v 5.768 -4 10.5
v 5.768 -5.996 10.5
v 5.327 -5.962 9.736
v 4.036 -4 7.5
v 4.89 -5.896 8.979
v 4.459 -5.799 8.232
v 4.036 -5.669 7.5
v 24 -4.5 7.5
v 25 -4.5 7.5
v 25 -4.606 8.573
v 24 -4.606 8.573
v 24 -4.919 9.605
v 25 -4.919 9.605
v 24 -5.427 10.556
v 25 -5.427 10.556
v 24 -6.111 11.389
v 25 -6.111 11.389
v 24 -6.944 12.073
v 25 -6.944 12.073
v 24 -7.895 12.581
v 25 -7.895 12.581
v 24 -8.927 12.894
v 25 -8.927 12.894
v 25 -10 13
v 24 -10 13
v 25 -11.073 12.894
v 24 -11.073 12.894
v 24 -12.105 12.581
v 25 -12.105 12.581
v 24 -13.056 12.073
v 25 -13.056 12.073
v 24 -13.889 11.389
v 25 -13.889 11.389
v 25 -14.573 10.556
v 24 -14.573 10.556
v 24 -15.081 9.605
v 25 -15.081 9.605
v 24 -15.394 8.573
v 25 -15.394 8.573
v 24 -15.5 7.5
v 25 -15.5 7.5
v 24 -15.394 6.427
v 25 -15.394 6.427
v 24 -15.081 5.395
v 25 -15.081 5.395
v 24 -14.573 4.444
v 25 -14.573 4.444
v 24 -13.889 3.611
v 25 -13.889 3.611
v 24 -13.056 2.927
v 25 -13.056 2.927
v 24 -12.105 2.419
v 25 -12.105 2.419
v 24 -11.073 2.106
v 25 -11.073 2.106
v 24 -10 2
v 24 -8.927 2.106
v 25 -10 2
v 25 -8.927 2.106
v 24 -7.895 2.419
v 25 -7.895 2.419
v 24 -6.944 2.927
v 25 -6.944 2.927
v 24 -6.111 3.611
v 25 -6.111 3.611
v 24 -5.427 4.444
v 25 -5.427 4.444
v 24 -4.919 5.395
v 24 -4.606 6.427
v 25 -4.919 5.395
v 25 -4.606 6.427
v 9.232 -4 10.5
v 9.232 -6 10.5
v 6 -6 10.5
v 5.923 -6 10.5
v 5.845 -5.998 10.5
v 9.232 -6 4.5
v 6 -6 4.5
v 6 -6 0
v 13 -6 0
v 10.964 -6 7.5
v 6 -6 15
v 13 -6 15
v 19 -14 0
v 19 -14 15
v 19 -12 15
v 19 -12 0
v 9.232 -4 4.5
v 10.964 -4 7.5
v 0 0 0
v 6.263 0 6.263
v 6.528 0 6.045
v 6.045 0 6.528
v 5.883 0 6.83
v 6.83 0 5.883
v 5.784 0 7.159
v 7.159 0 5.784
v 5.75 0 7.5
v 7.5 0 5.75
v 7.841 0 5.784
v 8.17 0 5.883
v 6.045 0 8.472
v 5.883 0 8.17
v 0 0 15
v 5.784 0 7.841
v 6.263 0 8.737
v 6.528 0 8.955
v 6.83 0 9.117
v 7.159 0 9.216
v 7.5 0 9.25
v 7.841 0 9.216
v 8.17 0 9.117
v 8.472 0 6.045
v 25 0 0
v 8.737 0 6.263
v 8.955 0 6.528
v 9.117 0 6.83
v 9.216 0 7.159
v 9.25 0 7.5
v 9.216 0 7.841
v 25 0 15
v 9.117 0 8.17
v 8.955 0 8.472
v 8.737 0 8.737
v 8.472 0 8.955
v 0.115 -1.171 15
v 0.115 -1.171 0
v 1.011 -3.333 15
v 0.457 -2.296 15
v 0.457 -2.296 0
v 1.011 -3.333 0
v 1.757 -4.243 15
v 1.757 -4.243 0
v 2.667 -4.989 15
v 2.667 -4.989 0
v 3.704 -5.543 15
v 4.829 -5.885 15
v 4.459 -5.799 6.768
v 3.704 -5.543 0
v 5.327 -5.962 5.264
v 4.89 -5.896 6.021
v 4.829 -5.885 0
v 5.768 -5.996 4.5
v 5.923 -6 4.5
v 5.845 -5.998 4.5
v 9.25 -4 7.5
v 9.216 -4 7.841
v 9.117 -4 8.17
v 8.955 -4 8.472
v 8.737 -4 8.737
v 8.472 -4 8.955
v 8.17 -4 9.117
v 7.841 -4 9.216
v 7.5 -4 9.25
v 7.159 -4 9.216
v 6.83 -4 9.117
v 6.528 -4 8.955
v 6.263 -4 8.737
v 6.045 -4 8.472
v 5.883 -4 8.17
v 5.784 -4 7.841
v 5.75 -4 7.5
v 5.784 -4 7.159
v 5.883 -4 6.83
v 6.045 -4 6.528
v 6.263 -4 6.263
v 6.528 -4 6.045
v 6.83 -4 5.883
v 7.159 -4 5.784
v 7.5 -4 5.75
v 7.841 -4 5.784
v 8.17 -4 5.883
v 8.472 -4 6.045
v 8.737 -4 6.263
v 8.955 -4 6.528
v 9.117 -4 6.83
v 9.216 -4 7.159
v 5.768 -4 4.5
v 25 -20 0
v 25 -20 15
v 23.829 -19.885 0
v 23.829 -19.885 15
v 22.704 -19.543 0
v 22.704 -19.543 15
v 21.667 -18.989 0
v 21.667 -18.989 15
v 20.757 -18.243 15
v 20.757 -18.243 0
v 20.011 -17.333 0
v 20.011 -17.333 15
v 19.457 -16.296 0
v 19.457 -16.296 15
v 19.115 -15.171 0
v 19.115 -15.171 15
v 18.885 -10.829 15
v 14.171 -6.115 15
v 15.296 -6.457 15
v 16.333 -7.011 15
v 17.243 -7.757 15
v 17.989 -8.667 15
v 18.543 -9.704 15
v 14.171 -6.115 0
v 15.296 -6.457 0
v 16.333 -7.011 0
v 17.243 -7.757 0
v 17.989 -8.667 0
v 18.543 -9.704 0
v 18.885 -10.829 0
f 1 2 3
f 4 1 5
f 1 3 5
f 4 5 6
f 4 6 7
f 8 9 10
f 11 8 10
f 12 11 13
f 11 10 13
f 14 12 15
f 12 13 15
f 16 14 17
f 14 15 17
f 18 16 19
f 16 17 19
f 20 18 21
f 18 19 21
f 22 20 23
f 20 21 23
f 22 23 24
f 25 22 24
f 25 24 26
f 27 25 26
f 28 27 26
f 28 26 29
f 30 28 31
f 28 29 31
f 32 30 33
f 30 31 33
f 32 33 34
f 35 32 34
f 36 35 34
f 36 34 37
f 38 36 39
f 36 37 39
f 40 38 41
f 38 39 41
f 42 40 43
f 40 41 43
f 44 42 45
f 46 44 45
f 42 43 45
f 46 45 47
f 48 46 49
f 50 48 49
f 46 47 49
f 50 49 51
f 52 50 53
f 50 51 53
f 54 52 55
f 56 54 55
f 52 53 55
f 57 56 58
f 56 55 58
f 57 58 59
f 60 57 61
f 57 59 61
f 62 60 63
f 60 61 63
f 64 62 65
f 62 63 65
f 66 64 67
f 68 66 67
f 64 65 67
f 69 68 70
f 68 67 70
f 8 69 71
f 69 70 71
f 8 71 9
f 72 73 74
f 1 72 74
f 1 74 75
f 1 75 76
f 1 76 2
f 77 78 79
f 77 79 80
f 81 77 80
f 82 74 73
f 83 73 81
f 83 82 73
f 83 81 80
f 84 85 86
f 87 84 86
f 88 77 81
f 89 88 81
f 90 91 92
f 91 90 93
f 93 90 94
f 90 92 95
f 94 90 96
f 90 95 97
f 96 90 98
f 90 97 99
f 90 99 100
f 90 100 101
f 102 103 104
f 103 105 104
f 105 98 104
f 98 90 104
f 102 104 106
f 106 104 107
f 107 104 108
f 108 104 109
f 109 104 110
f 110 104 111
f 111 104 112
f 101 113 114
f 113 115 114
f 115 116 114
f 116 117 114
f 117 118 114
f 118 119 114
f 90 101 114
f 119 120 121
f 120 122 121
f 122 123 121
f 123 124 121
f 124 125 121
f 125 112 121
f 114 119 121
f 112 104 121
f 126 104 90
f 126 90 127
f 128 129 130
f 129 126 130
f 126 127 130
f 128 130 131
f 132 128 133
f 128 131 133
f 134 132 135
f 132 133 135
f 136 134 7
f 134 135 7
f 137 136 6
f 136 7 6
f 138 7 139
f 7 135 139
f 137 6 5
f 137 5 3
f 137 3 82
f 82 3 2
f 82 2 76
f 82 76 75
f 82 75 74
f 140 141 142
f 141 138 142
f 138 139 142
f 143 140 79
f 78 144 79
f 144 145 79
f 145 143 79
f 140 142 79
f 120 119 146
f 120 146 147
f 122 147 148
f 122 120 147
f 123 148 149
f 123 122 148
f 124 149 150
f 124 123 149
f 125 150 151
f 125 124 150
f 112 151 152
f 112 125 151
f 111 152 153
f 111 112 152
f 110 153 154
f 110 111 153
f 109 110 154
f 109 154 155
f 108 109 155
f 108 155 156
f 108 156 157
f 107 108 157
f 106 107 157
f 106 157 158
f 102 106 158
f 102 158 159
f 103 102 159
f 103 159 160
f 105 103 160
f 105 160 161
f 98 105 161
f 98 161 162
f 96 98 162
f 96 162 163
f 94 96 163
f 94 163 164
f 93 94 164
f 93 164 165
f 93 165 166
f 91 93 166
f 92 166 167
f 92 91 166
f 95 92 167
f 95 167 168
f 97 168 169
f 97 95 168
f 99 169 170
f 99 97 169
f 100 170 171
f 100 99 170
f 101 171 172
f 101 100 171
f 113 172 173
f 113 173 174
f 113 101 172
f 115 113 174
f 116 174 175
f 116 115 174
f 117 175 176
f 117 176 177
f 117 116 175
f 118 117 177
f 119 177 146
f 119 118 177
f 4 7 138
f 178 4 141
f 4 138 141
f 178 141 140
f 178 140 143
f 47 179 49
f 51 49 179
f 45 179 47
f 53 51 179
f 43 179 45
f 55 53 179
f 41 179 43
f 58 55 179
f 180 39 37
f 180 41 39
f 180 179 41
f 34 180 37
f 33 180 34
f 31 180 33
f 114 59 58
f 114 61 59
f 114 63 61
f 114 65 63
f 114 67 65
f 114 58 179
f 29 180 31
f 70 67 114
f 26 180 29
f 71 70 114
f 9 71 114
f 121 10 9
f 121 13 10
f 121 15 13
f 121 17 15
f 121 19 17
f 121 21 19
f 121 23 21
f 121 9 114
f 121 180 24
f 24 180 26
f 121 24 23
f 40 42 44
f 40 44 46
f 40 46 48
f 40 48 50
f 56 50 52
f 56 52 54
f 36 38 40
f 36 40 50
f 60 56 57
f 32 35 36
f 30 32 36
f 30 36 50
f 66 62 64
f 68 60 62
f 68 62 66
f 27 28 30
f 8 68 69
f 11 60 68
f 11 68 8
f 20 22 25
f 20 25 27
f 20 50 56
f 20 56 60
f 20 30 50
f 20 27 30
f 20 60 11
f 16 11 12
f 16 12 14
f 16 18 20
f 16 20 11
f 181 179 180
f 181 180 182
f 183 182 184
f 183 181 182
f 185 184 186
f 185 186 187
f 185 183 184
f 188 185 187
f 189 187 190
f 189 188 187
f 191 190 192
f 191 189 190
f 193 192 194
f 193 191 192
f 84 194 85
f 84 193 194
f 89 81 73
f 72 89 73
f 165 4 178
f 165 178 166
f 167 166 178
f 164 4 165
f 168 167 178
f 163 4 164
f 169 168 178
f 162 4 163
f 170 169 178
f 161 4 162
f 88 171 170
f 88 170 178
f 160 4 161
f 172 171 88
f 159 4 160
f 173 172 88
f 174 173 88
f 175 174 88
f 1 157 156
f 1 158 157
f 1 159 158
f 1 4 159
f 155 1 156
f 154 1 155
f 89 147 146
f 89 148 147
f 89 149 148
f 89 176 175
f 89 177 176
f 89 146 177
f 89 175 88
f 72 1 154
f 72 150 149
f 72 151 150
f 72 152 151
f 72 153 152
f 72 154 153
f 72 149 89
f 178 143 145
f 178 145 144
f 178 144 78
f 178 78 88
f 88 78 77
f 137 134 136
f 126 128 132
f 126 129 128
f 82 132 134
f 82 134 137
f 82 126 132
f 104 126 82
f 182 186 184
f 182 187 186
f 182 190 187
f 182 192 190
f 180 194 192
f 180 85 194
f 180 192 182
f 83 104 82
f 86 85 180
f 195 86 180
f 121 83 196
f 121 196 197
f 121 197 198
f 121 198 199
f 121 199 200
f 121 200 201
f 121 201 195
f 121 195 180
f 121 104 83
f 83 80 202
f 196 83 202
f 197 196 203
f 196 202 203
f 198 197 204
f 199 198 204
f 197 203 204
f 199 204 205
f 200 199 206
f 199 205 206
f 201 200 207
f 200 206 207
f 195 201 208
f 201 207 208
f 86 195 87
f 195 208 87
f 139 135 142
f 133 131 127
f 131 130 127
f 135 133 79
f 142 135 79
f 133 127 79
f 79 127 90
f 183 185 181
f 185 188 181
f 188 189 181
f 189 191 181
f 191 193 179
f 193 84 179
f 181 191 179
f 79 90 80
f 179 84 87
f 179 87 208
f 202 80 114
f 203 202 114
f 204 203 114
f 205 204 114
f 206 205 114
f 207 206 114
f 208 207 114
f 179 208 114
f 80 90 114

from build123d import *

# Parameters (mm, degrees)
F3_W         = 25
F3_H         = 15
F3_R         = 1.75
F4_DEPTH     = 6
F5_W         = 14
F5_H         = 15
F6_DEPTH     = 6
F7_R         = 5.5
F8_DEPTH     = 1
F9_R         = 1.75
F10_DEPTH    = 2
F11_T1_DEPTH = 15
F11_T3_DEPTH = 45


# Not quite as in the source:
# - a fillet or chamfer that OpenCascade refuses, or shapes differently, is made with other operations: its cross-section is extruded or revolved along the edge and cut away or added


with BuildPart() as f4:
    # F3 (on Front) → F4 (new body)
    with BuildSketch(Plane.XZ):
        with Locations((12.5, 7.5)):
            Rectangle(F3_W, F3_H)
        with Locations((7.5, 7.5)):
            Circle(F3_R, mode=Mode.SUBTRACT)
    extrude(amount=F4_DEPTH)

    # F5 (on face) → F6 (join)
    with BuildSketch(Plane.YZ.offset(25)):
        with Locations((-13, 7.5)):
            Rectangle(F5_W, F5_H)
    extrude(amount=-F6_DEPTH)

    # F7 (on face) → F8 (cut)
    with BuildSketch(Plane.YZ.offset(25)):
        with Locations((-10, 7.5)):
            Circle(F7_R)
    extrude(amount=-F8_DEPTH, mode=Mode.SUBTRACT)

    # F9 (on face) → F10 (cut)
    with BuildSketch(Plane.XZ.offset(6)):
        Polygon((10.9641016151, 7.5), (9.2320508076, 10.5), (5.7679491924, 10.5), (4.0358983849, 7.5), (5.7679491924, 4.5), (9.2320508076, 4.5), align=None)
        with Locations((7.5, 7.5)):
            Circle(F9_R, mode=Mode.SUBTRACT)
    extrude(amount=-F10_DEPTH, mode=Mode.SUBTRACT)

    # F11: fillet of radius 6 on 3 edges, made by hand

    # F11_s2 → F11_t1 (join)
    with BuildSketch(Plane.XY):
        with BuildLine():
            ThreePointArc((13, -6), (17.2426406871, -7.7573593129), (19, -12))
            Line((19, -12), (19, -6))
            Line((19, -6), (13, -6))
        make_face()
    extrude(amount=F11_T1_DEPTH)

    # F11_s4 → F11_t3 (cut)
    with BuildSketch(Plane.XY.offset(-15)):
        with BuildLine():
            ThreePointArc((0, 0), (1.7573593129, -4.2426406871), (6, -6))
            Line((6, -6), (0, -6))
            Line((0, -6), (0, 0))
        make_face()
        with BuildLine():
            ThreePointArc((25, -20), (20.7573593129, -18.2426406871), (19, -14))
            Line((19, -14), (19, -20))
            Line((19, -20), (25, -20))
        make_face()
    extrude(amount=F11_T3_DEPTH, mode=Mode.SUBTRACT)


solid = f4.part
